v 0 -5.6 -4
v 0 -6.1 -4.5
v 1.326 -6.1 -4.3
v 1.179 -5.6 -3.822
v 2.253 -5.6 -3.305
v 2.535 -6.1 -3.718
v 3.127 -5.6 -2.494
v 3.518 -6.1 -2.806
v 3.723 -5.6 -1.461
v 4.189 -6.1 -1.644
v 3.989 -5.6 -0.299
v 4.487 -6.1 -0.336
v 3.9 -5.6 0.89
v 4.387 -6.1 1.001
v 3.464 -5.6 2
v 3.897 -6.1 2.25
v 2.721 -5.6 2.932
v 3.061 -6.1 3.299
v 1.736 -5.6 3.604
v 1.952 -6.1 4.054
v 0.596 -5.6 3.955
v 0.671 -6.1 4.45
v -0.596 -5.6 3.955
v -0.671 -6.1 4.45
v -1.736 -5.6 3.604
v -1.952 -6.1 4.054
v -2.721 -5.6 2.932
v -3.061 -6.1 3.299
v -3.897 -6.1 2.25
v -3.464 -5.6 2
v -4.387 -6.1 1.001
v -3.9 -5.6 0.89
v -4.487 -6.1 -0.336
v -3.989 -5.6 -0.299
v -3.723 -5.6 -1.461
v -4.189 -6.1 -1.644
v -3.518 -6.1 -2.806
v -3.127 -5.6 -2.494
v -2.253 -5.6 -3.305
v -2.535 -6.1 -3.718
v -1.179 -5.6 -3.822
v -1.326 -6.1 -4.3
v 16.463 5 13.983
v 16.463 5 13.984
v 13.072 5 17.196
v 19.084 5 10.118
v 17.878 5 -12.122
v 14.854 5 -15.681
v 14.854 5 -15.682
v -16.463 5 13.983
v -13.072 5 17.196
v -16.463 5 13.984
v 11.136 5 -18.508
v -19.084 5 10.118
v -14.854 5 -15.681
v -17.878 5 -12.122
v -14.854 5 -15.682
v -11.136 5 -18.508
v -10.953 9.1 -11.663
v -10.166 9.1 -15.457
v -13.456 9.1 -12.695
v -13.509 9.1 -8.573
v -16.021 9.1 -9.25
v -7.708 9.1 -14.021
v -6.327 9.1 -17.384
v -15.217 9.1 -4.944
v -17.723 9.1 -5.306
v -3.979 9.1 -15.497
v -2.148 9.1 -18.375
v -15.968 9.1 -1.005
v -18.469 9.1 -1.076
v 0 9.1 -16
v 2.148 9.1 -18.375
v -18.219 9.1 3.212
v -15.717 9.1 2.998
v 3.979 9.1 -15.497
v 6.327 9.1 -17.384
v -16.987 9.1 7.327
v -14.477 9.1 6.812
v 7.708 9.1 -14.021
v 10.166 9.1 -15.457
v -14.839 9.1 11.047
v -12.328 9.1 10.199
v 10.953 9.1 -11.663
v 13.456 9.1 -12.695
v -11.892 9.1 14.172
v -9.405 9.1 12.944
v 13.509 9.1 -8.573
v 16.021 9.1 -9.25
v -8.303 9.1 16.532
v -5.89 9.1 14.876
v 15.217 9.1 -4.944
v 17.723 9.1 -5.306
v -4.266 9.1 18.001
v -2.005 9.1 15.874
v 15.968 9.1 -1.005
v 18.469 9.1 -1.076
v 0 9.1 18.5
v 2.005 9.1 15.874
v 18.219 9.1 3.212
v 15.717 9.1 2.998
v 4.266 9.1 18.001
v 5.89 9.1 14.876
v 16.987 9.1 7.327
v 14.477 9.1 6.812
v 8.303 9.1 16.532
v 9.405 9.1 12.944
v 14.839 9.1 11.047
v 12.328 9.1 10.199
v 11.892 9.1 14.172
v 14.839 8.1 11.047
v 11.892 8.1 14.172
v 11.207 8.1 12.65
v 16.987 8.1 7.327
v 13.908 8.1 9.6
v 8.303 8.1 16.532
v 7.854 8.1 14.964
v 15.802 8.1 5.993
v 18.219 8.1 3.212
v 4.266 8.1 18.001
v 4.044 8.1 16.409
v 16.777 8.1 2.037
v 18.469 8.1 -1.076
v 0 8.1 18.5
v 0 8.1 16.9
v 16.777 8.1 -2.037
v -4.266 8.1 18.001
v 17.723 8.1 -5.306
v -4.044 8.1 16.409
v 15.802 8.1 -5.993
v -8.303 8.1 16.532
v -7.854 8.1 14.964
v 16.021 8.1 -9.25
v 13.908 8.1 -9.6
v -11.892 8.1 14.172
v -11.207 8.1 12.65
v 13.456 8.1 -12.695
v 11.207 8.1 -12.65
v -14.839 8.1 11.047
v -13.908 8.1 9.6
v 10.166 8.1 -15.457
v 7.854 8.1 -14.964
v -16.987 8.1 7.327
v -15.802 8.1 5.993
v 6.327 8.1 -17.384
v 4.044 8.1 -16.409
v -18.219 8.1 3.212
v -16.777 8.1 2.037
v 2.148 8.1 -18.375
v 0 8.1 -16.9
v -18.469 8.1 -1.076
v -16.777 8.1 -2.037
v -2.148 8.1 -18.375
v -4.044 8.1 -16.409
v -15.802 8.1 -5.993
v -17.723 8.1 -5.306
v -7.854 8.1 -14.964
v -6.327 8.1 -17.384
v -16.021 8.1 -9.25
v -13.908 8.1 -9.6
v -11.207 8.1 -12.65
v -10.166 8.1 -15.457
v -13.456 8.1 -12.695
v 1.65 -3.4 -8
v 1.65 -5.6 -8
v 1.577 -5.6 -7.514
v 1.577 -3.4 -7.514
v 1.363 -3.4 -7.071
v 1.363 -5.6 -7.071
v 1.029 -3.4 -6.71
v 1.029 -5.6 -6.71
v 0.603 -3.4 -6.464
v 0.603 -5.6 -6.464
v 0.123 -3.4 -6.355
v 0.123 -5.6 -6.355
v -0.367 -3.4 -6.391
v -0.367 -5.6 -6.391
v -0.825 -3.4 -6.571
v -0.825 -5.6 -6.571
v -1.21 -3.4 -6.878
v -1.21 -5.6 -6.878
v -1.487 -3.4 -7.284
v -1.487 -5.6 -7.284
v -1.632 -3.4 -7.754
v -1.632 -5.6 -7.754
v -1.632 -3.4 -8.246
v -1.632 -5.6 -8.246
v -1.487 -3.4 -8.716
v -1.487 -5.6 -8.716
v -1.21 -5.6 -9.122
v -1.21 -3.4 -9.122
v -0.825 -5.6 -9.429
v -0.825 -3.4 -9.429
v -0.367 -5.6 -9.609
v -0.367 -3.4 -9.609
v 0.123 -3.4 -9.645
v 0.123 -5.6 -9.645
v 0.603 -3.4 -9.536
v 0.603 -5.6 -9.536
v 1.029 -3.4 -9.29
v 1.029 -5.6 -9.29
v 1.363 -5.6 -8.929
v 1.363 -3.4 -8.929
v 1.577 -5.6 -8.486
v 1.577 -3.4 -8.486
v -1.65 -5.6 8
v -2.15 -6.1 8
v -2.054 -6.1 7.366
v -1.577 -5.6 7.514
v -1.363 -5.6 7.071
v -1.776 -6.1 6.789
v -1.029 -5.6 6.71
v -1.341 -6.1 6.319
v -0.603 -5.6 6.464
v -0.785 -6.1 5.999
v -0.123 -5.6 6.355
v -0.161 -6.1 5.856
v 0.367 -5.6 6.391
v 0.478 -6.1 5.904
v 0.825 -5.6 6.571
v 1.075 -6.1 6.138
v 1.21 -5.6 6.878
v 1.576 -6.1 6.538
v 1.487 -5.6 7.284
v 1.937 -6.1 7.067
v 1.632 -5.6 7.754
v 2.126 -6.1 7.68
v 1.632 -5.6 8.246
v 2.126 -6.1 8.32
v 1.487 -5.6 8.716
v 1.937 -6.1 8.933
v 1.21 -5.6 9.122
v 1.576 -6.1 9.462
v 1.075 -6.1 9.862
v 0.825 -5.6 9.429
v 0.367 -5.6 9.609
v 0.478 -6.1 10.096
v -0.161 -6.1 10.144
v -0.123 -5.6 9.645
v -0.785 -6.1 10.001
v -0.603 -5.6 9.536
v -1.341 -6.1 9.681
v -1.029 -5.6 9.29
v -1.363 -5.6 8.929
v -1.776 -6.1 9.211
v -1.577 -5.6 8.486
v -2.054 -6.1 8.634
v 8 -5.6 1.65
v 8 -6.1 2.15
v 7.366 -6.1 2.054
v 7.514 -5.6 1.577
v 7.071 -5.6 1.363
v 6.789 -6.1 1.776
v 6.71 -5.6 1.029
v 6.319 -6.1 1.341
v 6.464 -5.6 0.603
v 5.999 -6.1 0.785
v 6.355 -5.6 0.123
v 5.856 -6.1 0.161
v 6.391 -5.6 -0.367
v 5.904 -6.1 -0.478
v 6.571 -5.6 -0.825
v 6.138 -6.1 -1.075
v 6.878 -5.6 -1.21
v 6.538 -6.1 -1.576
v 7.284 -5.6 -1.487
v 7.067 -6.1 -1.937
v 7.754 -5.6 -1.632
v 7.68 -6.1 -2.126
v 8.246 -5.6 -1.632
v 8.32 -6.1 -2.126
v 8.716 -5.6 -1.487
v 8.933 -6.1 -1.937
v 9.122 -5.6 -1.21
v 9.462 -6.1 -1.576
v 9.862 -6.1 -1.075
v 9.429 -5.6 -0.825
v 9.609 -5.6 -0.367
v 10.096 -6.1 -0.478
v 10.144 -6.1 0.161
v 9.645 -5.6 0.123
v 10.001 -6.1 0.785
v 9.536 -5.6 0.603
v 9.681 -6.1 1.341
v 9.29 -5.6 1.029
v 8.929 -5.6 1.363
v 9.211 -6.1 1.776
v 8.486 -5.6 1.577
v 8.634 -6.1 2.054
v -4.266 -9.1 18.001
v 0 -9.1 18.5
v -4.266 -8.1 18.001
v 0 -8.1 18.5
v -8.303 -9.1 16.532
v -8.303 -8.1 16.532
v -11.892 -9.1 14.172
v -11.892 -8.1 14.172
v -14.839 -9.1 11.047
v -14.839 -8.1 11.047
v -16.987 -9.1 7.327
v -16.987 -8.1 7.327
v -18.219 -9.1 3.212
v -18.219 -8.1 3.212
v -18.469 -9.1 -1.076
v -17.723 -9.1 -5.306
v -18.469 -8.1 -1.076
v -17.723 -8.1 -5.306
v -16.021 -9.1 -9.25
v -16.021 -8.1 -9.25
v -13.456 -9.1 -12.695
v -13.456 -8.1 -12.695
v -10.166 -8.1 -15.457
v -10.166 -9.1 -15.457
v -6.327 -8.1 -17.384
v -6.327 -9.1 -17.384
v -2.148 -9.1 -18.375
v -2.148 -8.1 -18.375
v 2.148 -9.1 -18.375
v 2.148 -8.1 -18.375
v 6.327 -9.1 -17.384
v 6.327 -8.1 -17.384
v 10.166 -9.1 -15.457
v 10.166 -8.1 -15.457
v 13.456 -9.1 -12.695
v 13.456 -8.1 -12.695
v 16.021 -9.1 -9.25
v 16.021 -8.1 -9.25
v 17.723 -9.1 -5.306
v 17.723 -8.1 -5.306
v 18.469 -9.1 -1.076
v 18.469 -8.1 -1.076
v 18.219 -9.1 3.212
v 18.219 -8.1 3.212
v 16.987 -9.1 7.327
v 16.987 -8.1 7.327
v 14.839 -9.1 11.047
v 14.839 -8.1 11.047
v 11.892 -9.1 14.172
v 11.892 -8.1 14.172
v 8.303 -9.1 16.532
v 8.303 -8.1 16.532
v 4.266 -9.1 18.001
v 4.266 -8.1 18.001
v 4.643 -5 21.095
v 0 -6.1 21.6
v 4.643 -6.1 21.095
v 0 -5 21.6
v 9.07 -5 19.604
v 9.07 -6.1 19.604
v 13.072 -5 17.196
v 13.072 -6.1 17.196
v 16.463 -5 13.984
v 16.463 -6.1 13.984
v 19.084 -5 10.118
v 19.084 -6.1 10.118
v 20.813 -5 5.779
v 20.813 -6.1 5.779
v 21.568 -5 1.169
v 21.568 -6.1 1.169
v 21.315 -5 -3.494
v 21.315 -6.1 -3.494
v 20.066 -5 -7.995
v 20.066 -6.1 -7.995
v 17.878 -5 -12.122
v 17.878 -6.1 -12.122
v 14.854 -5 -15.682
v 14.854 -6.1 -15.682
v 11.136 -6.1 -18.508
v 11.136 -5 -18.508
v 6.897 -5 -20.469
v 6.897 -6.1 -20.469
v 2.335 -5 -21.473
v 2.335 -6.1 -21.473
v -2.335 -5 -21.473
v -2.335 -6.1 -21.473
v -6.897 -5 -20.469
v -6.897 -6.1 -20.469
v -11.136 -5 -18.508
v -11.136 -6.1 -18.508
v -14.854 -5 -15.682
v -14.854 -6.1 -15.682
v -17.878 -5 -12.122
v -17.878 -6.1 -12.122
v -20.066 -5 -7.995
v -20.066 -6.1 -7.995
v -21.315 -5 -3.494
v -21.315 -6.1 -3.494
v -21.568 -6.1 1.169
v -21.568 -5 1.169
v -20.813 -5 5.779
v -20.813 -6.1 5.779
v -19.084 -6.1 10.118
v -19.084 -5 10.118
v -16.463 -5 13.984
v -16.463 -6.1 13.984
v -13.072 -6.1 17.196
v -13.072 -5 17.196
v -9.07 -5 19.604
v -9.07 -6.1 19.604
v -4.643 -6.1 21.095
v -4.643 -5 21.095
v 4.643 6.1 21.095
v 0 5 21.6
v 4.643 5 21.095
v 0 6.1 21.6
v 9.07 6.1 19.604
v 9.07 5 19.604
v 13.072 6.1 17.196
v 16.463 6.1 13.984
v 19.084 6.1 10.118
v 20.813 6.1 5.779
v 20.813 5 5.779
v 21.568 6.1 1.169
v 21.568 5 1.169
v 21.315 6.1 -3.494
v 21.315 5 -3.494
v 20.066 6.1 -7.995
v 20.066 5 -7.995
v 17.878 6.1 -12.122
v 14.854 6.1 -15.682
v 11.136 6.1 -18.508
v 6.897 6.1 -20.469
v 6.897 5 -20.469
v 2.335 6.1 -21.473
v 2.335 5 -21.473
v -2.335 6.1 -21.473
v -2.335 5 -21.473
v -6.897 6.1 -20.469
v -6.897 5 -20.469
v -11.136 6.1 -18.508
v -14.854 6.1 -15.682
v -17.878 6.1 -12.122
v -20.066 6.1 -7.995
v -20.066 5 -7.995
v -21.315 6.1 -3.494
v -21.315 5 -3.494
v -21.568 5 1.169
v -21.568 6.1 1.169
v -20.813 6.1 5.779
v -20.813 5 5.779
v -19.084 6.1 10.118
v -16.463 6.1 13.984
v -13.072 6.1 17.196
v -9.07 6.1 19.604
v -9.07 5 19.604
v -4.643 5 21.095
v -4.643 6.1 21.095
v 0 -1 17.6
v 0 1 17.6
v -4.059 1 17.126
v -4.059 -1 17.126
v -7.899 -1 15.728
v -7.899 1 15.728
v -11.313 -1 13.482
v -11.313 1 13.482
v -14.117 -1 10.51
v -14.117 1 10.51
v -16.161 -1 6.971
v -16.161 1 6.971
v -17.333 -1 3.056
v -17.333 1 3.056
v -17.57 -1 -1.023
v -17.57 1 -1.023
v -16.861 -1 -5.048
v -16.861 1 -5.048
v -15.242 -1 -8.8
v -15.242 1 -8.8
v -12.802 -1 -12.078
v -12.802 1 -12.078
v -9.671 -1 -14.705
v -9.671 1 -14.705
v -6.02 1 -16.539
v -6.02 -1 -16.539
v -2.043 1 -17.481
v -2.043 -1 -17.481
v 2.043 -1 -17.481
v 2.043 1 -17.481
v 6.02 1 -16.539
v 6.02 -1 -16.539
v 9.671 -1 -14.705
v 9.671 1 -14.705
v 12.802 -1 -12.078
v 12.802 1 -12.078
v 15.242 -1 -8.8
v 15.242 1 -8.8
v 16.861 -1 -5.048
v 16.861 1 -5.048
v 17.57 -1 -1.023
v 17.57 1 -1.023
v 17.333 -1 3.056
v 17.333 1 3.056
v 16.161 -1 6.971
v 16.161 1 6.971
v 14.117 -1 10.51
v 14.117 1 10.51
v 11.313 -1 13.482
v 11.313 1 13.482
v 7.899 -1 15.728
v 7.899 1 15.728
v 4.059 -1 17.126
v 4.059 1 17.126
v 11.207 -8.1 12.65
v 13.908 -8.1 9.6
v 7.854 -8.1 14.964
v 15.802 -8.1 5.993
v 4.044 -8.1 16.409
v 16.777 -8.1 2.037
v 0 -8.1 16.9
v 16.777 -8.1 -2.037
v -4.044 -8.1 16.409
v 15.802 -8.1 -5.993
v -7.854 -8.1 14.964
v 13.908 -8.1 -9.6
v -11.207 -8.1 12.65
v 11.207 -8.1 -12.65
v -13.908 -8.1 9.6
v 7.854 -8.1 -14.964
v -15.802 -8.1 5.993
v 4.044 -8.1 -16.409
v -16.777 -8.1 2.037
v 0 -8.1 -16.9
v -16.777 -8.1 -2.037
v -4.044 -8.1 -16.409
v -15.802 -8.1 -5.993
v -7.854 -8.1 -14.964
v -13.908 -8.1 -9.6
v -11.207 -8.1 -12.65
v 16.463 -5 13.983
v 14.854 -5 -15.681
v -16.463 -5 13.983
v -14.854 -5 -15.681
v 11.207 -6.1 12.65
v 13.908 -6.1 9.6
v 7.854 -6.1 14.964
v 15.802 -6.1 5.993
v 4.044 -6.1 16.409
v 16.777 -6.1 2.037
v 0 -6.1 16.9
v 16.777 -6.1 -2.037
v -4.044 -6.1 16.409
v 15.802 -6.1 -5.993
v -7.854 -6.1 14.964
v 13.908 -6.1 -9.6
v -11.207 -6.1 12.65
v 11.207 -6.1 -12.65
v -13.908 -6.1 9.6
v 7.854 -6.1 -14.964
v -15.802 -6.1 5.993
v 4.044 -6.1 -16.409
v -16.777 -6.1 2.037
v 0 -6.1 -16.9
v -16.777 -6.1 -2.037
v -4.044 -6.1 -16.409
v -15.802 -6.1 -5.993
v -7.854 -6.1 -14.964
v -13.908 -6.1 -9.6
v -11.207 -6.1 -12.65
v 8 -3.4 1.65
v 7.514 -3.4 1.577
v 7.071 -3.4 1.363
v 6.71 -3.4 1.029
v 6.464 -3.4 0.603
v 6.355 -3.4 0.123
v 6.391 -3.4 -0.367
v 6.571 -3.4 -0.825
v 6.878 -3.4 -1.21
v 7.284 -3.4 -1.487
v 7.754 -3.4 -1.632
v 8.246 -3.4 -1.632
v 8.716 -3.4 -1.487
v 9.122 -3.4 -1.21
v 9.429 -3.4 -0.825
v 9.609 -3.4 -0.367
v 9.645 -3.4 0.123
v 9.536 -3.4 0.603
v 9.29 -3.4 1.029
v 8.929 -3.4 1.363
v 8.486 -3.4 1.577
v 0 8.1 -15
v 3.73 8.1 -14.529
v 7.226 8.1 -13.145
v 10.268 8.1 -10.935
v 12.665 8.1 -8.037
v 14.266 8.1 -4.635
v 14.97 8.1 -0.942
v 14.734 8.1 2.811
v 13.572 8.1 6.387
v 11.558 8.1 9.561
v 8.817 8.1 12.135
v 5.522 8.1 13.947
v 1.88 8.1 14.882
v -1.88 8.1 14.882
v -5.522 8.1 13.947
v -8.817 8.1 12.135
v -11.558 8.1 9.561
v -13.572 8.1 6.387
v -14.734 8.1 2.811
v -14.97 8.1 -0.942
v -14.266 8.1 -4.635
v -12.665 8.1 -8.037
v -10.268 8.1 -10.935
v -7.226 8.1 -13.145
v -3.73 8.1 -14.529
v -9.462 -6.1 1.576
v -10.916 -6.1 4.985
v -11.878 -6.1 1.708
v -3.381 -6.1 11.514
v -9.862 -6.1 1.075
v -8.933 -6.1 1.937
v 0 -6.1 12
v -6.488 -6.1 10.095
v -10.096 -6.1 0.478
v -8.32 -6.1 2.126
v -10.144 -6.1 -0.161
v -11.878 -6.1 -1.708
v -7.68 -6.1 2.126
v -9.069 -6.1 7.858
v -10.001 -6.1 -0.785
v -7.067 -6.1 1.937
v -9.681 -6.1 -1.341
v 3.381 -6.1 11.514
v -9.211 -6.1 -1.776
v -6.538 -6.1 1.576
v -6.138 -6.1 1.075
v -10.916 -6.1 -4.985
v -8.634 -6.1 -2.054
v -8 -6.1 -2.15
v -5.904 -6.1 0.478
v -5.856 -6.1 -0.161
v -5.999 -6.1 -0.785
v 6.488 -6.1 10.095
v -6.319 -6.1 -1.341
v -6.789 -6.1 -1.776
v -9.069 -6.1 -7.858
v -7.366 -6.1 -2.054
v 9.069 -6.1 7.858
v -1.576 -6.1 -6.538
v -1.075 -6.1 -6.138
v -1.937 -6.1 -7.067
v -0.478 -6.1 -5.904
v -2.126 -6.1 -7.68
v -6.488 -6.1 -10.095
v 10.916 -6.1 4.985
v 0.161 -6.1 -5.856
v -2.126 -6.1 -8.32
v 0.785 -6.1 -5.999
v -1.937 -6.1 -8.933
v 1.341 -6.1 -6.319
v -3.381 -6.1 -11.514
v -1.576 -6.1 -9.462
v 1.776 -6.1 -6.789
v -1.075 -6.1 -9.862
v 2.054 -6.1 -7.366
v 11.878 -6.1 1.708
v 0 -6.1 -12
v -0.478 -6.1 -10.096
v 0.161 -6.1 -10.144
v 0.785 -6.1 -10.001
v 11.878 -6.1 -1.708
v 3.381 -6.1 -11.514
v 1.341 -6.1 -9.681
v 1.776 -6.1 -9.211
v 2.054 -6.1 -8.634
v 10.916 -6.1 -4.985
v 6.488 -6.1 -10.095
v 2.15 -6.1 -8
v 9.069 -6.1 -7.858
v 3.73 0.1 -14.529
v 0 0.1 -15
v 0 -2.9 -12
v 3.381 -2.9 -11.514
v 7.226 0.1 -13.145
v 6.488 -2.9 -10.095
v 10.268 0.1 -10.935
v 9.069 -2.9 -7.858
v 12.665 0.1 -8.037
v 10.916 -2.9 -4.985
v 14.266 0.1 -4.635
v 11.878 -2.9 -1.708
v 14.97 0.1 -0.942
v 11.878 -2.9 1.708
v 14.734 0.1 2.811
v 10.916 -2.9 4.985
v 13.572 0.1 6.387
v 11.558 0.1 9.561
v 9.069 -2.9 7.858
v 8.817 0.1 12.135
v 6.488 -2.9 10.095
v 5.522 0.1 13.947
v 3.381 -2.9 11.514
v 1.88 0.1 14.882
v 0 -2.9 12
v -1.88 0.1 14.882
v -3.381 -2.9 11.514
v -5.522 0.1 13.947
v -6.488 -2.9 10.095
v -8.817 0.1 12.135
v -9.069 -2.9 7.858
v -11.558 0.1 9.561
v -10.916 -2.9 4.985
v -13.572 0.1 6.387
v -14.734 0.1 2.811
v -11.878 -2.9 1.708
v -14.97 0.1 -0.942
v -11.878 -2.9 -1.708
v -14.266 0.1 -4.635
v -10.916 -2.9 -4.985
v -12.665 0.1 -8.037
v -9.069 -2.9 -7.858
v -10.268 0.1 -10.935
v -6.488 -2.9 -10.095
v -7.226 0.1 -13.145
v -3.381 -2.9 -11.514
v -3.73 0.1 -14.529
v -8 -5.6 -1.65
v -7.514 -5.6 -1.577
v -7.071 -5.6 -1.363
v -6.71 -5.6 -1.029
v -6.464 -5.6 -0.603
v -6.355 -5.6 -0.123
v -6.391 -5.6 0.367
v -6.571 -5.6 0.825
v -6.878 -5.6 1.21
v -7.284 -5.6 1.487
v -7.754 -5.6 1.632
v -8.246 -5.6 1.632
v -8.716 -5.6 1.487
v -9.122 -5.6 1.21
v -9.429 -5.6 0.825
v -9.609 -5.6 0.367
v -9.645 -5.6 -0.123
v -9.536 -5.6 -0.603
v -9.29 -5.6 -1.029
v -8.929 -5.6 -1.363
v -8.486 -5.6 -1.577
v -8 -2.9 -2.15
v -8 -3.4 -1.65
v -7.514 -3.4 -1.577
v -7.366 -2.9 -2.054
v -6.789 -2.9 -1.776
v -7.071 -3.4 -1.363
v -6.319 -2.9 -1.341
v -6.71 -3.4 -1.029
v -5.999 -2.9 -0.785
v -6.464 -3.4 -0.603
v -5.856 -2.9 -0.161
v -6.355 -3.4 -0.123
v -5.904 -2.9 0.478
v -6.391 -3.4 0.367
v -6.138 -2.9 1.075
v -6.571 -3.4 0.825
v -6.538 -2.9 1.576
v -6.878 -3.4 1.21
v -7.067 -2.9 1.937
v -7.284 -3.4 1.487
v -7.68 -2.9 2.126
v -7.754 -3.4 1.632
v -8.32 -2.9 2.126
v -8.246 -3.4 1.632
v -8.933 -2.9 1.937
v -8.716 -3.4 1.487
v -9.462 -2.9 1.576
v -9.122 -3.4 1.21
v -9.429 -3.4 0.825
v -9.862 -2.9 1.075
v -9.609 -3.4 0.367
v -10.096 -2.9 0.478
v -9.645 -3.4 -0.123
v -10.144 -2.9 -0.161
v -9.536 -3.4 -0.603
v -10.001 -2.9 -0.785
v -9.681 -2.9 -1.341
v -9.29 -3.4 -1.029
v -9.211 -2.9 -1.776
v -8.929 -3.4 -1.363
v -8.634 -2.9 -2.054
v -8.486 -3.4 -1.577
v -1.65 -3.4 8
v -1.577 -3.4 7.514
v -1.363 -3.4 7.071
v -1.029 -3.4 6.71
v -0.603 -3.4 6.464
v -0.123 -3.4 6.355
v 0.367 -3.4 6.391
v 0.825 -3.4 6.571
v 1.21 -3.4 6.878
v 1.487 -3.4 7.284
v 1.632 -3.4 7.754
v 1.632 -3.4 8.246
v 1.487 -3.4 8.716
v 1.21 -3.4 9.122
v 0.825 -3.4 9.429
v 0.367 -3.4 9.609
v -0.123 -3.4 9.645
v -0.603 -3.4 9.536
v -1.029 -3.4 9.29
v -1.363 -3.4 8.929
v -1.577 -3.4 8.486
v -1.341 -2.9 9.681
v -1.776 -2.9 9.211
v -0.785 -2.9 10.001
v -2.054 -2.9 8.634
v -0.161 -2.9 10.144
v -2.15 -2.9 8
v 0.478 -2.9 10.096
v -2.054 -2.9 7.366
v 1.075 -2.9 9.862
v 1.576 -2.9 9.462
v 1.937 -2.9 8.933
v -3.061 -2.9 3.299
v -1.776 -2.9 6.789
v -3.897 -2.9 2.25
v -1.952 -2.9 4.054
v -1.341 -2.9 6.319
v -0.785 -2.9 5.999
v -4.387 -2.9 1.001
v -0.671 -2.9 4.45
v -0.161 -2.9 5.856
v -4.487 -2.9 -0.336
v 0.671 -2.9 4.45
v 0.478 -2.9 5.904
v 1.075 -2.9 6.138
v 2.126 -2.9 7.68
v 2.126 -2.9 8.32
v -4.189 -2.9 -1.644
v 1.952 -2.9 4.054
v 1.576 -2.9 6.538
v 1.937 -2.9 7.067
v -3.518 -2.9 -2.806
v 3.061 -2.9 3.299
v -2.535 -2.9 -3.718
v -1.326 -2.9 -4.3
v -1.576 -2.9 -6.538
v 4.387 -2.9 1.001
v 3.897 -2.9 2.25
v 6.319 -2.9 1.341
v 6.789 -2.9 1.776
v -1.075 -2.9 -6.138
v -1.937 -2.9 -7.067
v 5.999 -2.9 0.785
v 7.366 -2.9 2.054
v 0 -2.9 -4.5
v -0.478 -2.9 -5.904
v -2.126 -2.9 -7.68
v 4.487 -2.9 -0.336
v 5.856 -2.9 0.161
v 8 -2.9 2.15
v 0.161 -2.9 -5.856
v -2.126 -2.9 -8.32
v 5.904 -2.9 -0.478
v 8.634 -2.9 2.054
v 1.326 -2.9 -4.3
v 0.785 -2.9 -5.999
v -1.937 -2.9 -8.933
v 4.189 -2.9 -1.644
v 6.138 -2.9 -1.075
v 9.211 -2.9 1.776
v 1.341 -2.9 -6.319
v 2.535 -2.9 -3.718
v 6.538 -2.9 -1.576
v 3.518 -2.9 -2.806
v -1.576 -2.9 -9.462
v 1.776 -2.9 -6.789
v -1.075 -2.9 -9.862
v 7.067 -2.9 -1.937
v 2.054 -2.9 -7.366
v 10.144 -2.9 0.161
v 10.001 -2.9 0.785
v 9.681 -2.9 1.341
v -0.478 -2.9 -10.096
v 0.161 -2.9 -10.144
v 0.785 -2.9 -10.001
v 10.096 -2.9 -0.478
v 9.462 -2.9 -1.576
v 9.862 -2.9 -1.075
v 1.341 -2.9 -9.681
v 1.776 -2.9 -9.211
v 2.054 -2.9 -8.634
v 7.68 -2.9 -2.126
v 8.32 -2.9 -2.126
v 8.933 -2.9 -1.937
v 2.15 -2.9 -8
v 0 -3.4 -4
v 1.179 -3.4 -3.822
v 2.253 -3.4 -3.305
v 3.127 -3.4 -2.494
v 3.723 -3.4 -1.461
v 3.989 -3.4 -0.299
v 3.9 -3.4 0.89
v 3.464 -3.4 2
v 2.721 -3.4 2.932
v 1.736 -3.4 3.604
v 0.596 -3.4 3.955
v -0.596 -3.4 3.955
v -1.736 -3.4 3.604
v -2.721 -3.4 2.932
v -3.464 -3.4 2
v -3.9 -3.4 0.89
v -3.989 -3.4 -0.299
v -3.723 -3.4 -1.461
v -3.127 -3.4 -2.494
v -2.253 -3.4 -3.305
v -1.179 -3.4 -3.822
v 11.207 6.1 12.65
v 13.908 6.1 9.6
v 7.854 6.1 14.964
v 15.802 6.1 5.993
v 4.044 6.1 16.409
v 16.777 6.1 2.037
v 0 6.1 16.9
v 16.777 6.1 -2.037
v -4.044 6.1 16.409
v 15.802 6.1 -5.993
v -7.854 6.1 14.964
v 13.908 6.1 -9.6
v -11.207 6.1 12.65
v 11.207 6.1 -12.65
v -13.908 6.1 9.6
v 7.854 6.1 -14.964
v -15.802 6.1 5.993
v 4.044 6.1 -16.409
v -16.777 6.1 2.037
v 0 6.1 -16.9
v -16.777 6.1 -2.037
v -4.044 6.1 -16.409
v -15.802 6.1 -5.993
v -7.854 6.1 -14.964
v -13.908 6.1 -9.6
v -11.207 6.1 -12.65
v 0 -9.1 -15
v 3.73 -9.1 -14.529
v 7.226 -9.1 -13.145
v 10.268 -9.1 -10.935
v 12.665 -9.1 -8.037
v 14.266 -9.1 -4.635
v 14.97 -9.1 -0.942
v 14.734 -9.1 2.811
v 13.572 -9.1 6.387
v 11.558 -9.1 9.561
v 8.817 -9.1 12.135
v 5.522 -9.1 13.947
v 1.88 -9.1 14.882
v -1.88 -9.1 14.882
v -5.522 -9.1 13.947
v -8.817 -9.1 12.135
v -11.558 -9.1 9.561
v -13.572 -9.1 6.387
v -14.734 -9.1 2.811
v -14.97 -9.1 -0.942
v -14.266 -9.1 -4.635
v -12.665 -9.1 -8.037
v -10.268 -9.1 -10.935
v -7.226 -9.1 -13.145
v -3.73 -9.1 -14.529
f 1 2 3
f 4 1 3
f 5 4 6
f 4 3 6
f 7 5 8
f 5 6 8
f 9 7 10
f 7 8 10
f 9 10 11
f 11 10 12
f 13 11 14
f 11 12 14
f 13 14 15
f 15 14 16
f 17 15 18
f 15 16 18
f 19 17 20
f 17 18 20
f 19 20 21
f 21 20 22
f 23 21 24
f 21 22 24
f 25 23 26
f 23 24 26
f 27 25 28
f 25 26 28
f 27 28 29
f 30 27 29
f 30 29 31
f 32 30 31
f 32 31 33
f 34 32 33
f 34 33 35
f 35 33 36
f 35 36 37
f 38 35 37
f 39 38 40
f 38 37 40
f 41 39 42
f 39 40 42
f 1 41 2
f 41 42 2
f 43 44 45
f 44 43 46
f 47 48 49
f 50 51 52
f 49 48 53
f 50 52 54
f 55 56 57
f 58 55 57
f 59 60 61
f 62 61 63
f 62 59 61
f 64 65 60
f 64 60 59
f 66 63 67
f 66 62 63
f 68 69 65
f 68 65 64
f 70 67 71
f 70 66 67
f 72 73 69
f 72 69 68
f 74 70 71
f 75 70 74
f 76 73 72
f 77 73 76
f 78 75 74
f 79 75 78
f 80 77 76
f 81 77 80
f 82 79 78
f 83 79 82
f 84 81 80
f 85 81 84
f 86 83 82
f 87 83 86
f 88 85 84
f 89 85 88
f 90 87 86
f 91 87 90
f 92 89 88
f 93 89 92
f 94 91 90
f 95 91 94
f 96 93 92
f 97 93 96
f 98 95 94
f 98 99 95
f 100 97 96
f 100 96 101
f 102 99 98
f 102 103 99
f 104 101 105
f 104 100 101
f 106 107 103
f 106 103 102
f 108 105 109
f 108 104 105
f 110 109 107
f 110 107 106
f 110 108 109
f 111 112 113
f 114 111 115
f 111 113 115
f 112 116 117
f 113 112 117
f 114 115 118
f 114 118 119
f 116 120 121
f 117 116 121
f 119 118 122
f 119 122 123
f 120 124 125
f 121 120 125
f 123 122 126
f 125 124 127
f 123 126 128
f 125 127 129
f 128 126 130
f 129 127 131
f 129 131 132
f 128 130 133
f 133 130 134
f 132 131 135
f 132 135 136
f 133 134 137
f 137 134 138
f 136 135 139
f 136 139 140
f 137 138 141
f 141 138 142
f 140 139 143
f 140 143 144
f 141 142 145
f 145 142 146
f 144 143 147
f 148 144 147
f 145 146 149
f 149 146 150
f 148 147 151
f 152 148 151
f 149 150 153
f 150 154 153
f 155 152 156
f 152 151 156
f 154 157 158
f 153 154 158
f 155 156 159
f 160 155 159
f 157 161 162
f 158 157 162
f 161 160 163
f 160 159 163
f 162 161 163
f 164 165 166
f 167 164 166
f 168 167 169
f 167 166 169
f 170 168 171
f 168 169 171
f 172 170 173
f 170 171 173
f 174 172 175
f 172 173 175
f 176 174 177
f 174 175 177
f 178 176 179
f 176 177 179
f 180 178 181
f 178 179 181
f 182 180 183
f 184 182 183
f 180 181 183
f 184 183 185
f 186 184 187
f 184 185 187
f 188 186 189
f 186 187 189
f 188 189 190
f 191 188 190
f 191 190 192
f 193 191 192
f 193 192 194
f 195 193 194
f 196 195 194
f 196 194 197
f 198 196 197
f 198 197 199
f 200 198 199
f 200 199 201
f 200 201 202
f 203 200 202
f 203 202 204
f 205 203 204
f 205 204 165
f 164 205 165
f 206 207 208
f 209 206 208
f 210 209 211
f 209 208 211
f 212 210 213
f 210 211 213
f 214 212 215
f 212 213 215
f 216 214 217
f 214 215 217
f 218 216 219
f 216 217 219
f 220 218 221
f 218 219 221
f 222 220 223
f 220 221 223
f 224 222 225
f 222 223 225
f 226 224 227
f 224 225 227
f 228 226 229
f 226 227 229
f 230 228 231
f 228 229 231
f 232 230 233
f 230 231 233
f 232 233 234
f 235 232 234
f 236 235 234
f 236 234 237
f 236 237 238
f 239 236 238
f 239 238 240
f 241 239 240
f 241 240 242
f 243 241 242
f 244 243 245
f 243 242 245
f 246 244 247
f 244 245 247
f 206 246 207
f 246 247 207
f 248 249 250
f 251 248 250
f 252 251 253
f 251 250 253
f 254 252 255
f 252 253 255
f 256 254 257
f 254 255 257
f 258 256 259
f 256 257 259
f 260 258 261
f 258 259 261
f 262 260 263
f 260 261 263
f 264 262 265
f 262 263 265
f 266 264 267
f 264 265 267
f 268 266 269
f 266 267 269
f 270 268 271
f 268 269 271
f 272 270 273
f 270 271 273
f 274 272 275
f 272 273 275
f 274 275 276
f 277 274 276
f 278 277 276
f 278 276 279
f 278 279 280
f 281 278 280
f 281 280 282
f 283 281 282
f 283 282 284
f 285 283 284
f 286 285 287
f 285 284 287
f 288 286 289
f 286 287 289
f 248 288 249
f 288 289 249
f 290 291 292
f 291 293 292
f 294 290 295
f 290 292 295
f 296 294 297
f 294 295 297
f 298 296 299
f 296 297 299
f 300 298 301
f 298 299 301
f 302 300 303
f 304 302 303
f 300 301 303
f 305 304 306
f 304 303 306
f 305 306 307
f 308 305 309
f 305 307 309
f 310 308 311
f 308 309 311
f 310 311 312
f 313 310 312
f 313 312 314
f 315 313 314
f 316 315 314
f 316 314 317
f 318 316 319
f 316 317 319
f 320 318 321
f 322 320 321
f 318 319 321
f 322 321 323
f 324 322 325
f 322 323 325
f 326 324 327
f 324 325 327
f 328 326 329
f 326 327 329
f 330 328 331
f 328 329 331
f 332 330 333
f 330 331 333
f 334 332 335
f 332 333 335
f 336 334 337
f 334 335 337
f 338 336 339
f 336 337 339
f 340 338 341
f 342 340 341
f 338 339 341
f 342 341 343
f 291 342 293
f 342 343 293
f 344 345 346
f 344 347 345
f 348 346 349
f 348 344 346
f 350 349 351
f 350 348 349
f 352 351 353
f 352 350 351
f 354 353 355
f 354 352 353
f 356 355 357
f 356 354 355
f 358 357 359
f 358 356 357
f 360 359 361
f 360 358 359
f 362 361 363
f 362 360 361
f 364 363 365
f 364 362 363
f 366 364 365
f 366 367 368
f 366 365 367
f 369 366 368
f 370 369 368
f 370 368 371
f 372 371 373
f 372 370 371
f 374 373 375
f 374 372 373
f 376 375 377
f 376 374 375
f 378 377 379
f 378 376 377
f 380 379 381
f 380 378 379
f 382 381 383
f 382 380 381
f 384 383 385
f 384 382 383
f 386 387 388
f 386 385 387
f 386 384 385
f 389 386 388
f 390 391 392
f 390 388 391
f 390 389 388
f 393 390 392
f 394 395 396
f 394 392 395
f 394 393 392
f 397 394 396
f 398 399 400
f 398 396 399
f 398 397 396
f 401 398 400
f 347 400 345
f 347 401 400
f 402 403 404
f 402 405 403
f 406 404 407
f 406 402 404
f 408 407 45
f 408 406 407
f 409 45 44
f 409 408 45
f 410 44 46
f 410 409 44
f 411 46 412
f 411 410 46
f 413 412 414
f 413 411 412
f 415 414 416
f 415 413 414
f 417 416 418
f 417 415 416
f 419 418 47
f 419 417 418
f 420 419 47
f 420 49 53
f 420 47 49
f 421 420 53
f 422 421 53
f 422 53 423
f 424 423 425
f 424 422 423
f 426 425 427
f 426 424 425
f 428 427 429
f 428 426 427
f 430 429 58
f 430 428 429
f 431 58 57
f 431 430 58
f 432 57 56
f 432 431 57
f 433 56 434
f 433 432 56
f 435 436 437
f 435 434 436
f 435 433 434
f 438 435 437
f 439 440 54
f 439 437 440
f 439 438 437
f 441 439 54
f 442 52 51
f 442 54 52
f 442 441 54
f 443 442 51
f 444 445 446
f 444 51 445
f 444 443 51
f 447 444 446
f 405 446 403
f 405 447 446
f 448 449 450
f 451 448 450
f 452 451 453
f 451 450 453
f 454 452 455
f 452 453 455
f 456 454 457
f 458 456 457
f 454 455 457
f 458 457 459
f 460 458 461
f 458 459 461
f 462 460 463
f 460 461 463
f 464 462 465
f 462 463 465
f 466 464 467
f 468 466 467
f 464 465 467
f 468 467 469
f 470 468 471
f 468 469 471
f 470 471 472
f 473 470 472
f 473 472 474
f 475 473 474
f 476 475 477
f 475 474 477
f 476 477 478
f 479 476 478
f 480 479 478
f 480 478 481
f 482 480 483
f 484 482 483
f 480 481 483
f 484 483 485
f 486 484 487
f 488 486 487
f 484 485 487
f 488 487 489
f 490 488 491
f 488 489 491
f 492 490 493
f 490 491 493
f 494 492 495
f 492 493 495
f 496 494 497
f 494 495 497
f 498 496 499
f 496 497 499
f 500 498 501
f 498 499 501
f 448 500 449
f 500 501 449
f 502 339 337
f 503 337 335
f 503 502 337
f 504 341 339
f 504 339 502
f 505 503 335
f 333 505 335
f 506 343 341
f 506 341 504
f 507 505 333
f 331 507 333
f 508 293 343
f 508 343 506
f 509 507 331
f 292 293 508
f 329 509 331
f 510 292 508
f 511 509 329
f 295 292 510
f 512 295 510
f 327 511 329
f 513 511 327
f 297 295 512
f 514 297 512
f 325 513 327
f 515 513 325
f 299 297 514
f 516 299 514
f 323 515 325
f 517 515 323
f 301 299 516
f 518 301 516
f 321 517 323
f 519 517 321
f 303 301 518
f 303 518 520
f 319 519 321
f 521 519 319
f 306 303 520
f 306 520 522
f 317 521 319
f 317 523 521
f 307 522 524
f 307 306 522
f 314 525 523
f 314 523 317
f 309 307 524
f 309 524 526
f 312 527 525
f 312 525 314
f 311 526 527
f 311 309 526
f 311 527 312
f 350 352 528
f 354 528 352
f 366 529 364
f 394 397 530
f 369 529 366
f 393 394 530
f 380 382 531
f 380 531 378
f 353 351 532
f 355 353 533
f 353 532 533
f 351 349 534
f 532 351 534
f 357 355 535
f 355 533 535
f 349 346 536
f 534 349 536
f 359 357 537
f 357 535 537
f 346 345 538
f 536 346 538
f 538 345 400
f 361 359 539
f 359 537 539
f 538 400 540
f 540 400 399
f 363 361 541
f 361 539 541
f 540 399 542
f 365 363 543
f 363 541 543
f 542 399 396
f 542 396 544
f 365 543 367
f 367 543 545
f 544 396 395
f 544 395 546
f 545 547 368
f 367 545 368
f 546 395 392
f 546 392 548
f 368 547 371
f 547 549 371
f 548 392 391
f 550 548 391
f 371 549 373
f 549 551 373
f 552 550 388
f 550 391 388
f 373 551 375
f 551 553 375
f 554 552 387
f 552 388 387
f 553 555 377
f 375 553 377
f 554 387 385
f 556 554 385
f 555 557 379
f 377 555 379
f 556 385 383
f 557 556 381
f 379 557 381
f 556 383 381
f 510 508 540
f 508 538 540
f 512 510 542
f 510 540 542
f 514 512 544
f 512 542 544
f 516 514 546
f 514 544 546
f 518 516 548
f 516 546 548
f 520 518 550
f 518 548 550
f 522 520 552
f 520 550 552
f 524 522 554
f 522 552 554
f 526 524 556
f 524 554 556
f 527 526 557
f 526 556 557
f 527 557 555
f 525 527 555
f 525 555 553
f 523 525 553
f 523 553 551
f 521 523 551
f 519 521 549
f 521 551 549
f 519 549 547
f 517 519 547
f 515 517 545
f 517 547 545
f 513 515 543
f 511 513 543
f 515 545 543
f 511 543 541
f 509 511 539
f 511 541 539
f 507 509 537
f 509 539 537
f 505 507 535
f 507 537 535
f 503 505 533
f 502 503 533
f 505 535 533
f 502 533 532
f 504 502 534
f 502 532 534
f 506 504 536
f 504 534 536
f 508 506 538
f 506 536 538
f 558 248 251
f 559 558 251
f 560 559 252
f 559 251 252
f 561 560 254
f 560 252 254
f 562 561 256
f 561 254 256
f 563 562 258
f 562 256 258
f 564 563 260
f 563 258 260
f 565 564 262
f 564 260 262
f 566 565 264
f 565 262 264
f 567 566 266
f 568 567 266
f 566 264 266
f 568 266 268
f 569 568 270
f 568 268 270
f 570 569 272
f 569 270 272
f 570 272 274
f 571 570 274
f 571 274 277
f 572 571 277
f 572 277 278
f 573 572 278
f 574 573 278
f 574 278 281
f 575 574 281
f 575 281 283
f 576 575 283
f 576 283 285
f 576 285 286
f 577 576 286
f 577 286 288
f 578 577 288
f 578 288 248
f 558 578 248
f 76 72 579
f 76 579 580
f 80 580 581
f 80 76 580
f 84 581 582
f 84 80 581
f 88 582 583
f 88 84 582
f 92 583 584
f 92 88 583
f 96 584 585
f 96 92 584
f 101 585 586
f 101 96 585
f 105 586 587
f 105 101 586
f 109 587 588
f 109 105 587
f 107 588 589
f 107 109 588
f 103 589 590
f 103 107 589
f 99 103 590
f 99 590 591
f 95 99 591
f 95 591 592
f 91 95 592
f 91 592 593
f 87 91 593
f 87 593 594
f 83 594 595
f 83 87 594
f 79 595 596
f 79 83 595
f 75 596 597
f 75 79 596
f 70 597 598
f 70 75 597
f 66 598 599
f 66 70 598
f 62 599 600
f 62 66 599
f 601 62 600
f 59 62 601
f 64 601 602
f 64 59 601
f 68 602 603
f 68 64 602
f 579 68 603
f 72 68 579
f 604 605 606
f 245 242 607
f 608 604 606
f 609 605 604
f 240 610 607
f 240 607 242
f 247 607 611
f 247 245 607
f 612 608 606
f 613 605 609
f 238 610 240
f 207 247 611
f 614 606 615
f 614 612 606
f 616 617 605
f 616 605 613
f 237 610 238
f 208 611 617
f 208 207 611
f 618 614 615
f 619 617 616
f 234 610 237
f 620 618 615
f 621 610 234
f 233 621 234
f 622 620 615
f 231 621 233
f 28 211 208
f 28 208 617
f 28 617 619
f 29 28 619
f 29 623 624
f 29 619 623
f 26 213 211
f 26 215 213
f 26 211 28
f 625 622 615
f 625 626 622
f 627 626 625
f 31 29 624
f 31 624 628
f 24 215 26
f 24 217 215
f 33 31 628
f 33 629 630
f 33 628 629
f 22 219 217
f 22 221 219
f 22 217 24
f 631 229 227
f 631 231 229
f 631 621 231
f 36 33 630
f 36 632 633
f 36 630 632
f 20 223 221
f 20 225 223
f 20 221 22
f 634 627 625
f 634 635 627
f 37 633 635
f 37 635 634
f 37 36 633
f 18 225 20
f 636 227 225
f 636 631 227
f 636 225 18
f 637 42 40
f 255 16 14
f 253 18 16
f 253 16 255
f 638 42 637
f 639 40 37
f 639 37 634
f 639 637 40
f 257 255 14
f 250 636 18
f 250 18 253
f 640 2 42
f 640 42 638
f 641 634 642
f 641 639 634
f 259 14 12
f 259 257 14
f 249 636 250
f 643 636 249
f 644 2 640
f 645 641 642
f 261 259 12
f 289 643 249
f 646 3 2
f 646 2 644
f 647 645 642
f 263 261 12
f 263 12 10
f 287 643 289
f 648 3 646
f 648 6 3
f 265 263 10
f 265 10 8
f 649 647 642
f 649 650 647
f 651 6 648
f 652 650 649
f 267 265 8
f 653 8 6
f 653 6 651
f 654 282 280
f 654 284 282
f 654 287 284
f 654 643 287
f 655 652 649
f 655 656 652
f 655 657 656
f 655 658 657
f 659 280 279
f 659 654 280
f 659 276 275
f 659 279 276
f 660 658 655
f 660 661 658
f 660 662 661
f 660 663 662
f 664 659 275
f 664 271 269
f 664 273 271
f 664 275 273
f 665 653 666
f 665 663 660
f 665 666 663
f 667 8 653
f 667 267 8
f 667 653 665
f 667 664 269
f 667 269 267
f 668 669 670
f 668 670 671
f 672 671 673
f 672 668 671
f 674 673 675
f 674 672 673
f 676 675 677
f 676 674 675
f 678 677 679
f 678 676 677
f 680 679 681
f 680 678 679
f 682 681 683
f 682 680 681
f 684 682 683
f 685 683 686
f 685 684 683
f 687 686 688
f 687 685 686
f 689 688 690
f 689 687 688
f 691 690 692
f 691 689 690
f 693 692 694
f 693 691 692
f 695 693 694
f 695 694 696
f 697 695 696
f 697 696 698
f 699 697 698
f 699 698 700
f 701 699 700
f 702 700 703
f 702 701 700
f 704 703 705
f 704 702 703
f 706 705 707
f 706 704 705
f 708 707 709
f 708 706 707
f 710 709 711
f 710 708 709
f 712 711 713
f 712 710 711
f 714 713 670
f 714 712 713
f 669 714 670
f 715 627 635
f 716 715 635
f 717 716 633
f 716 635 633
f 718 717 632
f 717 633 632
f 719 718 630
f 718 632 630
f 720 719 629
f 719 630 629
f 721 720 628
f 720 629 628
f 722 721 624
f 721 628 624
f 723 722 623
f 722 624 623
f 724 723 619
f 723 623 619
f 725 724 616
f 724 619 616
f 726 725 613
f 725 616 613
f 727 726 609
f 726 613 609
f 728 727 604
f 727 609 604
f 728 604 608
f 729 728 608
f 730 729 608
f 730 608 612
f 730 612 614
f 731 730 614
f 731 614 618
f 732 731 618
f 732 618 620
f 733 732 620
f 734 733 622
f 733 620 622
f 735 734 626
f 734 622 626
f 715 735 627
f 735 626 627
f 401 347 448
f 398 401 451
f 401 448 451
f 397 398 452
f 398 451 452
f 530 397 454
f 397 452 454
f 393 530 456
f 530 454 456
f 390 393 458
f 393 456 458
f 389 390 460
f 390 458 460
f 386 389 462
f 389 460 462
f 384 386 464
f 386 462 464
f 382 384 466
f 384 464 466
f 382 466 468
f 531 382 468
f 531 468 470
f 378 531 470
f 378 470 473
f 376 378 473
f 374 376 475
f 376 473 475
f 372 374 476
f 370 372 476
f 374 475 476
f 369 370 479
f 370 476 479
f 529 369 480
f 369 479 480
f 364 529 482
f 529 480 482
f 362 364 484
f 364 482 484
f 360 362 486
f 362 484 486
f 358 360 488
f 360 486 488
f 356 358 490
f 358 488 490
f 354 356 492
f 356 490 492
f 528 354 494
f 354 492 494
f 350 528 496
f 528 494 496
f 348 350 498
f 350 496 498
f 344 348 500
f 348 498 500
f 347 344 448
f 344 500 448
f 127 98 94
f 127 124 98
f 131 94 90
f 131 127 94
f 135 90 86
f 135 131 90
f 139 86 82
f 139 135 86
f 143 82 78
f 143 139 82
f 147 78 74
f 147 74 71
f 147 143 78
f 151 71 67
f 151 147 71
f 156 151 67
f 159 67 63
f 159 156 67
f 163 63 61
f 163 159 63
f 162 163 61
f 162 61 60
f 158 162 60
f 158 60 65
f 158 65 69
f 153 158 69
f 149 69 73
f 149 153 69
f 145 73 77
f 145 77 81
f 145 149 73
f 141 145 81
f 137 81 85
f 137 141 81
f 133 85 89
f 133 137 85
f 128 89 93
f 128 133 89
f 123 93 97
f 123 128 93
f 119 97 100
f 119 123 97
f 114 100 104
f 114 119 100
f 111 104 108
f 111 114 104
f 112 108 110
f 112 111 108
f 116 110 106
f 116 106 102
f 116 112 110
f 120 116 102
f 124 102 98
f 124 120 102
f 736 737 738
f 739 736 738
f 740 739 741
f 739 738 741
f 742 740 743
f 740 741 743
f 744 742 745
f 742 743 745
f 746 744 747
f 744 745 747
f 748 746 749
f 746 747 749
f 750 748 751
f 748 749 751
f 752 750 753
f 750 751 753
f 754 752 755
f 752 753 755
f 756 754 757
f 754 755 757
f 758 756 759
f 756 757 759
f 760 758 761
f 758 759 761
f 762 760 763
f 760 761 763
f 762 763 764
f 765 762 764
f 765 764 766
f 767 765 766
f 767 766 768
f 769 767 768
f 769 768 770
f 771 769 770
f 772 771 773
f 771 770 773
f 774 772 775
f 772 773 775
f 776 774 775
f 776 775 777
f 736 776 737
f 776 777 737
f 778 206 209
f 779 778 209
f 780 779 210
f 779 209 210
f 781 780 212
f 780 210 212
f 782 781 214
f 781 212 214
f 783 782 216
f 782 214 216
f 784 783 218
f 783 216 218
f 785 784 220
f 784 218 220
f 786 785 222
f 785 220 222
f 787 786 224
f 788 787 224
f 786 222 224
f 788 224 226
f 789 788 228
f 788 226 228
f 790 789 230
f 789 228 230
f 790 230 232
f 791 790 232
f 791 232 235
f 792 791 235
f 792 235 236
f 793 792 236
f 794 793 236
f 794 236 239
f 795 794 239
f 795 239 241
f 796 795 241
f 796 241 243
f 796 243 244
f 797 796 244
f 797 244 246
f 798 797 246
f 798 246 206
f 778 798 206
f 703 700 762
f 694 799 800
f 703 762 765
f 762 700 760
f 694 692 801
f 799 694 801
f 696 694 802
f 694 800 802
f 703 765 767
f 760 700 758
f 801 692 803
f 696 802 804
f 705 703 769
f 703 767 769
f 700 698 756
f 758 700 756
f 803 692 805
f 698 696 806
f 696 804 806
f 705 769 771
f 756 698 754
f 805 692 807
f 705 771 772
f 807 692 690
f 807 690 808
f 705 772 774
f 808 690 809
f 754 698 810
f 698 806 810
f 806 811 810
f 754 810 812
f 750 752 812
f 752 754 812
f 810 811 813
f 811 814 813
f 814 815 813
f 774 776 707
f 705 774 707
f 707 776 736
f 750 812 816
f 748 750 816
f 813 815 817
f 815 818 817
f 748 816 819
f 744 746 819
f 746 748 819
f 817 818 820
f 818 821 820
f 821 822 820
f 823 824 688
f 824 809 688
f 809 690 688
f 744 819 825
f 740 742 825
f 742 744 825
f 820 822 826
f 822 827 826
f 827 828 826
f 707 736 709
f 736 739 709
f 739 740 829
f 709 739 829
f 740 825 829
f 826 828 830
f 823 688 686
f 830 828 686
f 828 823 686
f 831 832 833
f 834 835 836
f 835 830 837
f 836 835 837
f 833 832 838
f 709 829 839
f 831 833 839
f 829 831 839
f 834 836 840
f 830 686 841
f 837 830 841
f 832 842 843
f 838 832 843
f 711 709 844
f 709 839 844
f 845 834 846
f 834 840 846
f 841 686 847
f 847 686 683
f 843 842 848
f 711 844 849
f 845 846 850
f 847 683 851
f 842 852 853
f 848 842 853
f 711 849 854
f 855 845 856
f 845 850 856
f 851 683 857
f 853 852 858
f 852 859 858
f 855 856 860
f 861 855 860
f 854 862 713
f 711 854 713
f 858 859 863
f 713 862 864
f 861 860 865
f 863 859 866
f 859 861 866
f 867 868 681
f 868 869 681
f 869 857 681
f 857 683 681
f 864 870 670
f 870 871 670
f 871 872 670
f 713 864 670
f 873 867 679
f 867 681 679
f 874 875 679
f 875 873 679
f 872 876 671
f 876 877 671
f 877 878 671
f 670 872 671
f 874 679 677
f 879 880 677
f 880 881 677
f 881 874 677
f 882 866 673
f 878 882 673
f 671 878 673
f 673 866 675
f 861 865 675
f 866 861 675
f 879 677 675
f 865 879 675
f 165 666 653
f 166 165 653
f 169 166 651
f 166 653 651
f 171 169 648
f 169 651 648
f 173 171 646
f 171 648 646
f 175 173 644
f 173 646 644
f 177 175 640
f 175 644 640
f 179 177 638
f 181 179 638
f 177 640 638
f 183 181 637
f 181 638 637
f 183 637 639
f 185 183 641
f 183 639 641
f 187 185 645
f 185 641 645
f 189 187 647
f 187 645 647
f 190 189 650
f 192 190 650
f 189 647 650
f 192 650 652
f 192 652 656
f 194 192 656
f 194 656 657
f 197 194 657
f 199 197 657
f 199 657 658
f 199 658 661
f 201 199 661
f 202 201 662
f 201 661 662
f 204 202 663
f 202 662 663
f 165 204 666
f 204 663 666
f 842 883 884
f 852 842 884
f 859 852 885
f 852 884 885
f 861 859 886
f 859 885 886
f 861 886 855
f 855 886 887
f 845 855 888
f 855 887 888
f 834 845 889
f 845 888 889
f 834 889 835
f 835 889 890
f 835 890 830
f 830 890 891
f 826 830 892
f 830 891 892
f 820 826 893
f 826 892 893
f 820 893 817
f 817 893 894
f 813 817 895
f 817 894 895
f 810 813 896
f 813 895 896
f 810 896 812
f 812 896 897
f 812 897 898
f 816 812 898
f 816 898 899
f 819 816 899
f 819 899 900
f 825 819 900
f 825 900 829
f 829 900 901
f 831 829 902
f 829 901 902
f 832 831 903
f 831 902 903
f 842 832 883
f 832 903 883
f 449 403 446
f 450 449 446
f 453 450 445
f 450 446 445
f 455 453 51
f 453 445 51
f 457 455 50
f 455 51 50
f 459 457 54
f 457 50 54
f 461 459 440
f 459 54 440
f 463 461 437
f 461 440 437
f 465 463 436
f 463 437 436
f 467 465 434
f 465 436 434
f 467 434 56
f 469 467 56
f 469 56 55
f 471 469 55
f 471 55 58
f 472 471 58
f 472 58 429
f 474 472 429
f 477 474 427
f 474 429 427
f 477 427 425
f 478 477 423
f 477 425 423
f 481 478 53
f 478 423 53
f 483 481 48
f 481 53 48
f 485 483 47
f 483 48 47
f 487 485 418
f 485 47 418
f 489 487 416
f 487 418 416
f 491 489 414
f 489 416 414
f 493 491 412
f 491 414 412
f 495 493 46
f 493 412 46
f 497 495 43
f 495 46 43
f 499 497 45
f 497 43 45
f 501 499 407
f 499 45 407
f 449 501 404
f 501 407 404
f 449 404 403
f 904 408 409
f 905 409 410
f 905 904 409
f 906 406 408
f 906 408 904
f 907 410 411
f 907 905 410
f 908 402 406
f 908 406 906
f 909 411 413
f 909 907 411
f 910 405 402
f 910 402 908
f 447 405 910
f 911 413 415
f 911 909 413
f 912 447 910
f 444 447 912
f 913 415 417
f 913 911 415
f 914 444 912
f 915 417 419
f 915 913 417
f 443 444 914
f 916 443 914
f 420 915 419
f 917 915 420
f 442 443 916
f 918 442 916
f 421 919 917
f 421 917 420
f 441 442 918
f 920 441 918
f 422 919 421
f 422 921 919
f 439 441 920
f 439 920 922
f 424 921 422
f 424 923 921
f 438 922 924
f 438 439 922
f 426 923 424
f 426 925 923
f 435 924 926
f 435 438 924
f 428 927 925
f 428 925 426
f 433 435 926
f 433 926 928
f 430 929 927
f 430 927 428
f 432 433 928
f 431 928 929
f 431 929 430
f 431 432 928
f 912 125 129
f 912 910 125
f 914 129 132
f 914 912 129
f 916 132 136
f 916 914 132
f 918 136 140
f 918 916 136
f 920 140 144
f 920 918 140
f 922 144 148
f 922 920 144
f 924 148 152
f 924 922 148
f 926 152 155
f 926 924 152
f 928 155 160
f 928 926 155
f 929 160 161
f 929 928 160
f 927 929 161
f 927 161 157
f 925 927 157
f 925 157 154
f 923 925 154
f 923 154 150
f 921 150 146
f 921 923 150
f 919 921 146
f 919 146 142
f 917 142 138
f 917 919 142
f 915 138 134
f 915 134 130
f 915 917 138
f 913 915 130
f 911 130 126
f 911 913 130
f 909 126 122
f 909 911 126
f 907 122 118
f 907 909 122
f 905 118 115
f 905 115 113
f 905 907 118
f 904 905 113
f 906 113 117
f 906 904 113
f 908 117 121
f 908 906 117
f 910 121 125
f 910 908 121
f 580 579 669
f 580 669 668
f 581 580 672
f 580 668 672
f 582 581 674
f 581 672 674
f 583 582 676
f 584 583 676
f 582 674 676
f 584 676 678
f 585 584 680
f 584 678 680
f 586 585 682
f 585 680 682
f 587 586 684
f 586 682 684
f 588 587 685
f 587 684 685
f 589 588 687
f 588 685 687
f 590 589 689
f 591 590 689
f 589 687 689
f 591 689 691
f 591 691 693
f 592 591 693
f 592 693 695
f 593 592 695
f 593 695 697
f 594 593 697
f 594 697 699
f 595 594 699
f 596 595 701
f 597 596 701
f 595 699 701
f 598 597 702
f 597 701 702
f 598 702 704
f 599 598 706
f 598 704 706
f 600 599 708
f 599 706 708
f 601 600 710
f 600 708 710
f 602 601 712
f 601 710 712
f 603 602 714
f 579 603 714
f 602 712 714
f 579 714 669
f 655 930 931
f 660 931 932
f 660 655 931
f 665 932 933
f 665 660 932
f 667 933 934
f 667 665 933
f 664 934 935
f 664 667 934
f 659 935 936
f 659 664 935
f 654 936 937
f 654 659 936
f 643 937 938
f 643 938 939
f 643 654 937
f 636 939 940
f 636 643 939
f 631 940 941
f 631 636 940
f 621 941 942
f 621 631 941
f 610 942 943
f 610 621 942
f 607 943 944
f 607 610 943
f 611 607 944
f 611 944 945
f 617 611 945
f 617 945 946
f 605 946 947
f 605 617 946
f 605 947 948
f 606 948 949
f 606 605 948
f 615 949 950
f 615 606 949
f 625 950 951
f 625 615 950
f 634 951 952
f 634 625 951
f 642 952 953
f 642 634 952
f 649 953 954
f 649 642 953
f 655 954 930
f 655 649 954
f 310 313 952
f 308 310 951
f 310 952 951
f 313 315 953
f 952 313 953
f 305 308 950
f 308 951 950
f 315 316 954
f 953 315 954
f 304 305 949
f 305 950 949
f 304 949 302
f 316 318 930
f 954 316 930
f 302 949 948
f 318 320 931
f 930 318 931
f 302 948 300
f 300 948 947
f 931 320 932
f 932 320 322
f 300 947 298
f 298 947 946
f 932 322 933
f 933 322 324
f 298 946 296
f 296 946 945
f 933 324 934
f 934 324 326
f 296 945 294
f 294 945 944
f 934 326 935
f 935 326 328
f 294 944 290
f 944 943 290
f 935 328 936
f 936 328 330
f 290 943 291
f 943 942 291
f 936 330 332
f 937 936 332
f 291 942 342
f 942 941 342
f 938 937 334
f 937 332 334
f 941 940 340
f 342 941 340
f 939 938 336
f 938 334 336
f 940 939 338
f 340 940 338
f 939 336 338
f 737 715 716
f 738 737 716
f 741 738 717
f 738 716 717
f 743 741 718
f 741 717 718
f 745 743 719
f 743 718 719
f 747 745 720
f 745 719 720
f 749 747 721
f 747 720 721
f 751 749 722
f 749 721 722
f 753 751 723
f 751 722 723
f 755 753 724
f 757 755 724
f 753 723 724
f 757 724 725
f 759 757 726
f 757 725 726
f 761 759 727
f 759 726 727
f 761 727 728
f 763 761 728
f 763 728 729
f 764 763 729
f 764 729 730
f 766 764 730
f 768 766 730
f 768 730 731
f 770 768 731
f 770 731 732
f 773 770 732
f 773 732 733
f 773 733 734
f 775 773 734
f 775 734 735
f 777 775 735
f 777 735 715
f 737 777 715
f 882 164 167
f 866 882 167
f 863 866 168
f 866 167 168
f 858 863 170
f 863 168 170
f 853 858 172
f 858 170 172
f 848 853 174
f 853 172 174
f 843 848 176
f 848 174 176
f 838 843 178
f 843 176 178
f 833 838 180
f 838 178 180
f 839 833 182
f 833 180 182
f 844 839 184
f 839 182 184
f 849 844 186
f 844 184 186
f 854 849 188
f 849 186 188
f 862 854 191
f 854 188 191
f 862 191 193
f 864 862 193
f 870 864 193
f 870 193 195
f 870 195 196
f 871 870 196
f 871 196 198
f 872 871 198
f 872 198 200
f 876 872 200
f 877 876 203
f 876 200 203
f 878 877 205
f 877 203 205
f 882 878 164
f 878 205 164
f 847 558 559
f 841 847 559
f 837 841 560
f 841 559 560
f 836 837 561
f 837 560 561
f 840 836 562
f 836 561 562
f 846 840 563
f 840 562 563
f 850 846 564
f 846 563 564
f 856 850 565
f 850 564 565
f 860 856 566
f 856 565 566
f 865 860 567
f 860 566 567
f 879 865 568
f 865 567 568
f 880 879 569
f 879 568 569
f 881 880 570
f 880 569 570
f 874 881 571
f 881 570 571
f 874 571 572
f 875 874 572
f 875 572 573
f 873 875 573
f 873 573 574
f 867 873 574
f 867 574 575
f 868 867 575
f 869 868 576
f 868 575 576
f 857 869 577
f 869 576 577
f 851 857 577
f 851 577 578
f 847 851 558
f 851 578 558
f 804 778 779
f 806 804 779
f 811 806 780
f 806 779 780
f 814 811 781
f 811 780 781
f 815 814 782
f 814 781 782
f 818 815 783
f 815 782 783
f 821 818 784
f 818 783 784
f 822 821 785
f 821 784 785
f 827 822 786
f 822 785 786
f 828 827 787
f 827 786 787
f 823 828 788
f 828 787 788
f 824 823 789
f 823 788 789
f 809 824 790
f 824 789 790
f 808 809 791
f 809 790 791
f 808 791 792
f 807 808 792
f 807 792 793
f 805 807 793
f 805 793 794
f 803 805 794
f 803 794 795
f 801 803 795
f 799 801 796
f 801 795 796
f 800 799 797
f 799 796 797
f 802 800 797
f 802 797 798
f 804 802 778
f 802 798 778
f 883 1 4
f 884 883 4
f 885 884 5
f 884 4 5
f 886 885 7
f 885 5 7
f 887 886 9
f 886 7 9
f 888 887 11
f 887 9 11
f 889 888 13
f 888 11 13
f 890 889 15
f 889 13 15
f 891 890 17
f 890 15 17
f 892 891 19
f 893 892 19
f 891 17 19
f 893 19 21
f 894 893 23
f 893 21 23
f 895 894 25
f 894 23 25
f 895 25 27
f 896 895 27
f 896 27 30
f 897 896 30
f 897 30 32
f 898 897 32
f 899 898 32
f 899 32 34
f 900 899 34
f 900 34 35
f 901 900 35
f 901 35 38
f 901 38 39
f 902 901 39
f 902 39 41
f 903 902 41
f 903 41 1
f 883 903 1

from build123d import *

# Parameters (mm, degrees)
SKETCH_1_R               = 21.6
EXTRUDE_1_DEPTH          = 9.1
SKETCH_2_W               = 4.7
SKETCH_2_H               = 2
SKETCH_2_W_2             = 3.1
SKETCH_2_H_2             = 1
SKETCH_3_R               = 15
CUT_EXTRUDE_1_DEPTH      = 3
SKETCH_4_R               = 4
CUT_EXTRUDE_2_DEPTH      = 20
SKETCH_5_R               = 1.65
CUT_EXTRUDE_3_DEPTH      = 20
PATTERN_CIRCULAR_1_COUNT = 4
CUT_EXTRUDE_START        = -6.2
SKETCH_3_2_R             = 15
CUT_EXTRUDE_4_DEPTH      = 12
SKETCH_6_W               = 4
SKETCH_6_H               = 10
CHAMFER_1_SIZE           = 4
CHAMFER_2_SIZE           = 3
CHAMFER_3_SIZE           = 1
CHAMFER_4_SIZE           = 0.5


with BuildPart() as part:
    # 草图1 → 凸台-拉伸1 (new, symmetric)
    with BuildSketch(Plane(origin=(0, 0, 0), x_dir=(1, 0, 0), z_dir=(0, 1, 0))):
        with Locations(Location((0, 0, 0), (0, 0, 270))):
            Circle(SKETCH_1_R)
    extrude(amount=EXTRUDE_1_DEPTH, both=True)

    # 草图2 → 切除-旋转1 (revolve, cut)
    with BuildSketch(Plane.XY, mode=Mode.PRIVATE) as cut_revolve_1_sk:
        with Locations((19.25, -7.1)):
            Rectangle(SKETCH_2_W, SKETCH_2_H)
        with Locations((20.05, -8.6)):
            Rectangle(SKETCH_2_W_2, SKETCH_2_H_2)
    cut_revolve_1 = revolve(cut_revolve_1_sk.sketch.rotate(Axis((0, 9.1, 0), (0, -1, 0)), 90), axis=Axis((0, 9.1, 0), (0, -1, 0)), mode=Mode.SUBTRACT)

    # 镜向1: 切除-旋转1 across plane
    add(cut_revolve_1.mirror(Plane.ZX), mode=Mode.SUBTRACT)

    # 草图3 → 切除-拉伸1 (cut)
    with BuildSketch(Plane.XZ.offset(9.1)):
        with Locations(Location((0, 0, 0), (0, 0, 270))):
            Circle(SKETCH_3_R)
    extrude(amount=-CUT_EXTRUDE_1_DEPTH, mode=Mode.SUBTRACT)

    # 草图4 → 切除-拉伸2 (cut)
    with BuildSketch(Plane.XZ.offset(6.1)):
        with Locations(Location((0, 0, 0), (0, 0, 270))):
            Circle(SKETCH_4_R)
    extrude(amount=-CUT_EXTRUDE_2_DEPTH, mode=Mode.SUBTRACT)

    # 草图5 → 切除-拉伸3 (cut)
    with BuildSketch(Plane.XZ.offset(6.1)):
        with Locations(Location((-8, 0, 0), (0, 0, 270))):
            Circle(SKETCH_5_R)
    cut_extrude_3 = extrude(amount=-CUT_EXTRUDE_3_DEPTH, mode=Mode.SUBTRACT)

    # 阵列(圆周)1: 切除-拉伸3 ×4 about axis
    pattern_circular_1_axis = Axis((0, 0, 0), (0, 1, 0))
    for i in range(1, PATTERN_CIRCULAR_1_COUNT):
        add(cut_extrude_3.rotate(pattern_circular_1_axis, i * 360 / PATTERN_CIRCULAR_1_COUNT), mode=Mode.SUBTRACT)

    # 草图3<2> → 切除-拉伸4 (cut)
    with BuildSketch(Plane.XZ.offset(9.1).offset(CUT_EXTRUDE_START)):
        with Locations(Location((0, 0, 0), (0, 0, 270))):
            Circle(SKETCH_3_2_R)
    extrude(amount=-CUT_EXTRUDE_4_DEPTH, mode=Mode.SUBTRACT)

    # 草图6 → 切除-旋转2 (revolve, cut)
    with BuildSketch(Plane.XY, mode=Mode.PRIVATE) as cut_revolve_2_sk:
        with Locations((19.6, 0)):
            Rectangle(SKETCH_6_W, SKETCH_6_H)
    revolve(cut_revolve_2_sk.sketch.rotate(Axis((0, 9.1, 0), (0, -1, 0)), 90), axis=Axis((0, 9.1, 0), (0, -1, 0)), mode=Mode.SUBTRACT)

    # 倒角1
    chamfer_1_edges = [part.edges().sort_by_distance(p)[0] for p in [
        (0, -5, -17.6),
        (0, 5, -17.6),
    ]]
    chamfer(chamfer_1_edges, length=CHAMFER_1_SIZE - 0.0001)  # a hair under: the kernel refuses the full size

    # 倒角2
    chamfer_2_edges = [part.edges().sort_by_distance(p)[0] for p in [
        (0, -6.1, 15),
        (0, -2.9, 15),
    ]]
    chamfer(chamfer_2_edges, length=CHAMFER_2_SIZE - 0.0001)  # a hair under: the kernel refuses the full size

    # 倒角3
    chamfer_3_edges = [part.edges().sort_by_distance(p)[0] for p in [
        (0, 9.1, 15),
    ]]
    chamfer(chamfer_3_edges, length=CHAMFER_3_SIZE)

    # 倒角4
    chamfer_4_edges = [part.edges().sort_by_distance(p)[0] for p in [
        (0, -6.1, 4),
        (-8, -6.1, 1.65),
        (-1.65, -6.1, -8),
        (8, -6.1, -1.65),
        (1.65, -6.1, 8),
        (0, -2.9, 4),
        (-8, -2.9, 1.65),
        (1.65, -2.9, 8),
        (8, -2.9, -1.65),
        (-1.65, -2.9, -8),
    ]]
    chamfer(chamfer_4_edges, length=CHAMFER_4_SIZE)


solid = part.part
